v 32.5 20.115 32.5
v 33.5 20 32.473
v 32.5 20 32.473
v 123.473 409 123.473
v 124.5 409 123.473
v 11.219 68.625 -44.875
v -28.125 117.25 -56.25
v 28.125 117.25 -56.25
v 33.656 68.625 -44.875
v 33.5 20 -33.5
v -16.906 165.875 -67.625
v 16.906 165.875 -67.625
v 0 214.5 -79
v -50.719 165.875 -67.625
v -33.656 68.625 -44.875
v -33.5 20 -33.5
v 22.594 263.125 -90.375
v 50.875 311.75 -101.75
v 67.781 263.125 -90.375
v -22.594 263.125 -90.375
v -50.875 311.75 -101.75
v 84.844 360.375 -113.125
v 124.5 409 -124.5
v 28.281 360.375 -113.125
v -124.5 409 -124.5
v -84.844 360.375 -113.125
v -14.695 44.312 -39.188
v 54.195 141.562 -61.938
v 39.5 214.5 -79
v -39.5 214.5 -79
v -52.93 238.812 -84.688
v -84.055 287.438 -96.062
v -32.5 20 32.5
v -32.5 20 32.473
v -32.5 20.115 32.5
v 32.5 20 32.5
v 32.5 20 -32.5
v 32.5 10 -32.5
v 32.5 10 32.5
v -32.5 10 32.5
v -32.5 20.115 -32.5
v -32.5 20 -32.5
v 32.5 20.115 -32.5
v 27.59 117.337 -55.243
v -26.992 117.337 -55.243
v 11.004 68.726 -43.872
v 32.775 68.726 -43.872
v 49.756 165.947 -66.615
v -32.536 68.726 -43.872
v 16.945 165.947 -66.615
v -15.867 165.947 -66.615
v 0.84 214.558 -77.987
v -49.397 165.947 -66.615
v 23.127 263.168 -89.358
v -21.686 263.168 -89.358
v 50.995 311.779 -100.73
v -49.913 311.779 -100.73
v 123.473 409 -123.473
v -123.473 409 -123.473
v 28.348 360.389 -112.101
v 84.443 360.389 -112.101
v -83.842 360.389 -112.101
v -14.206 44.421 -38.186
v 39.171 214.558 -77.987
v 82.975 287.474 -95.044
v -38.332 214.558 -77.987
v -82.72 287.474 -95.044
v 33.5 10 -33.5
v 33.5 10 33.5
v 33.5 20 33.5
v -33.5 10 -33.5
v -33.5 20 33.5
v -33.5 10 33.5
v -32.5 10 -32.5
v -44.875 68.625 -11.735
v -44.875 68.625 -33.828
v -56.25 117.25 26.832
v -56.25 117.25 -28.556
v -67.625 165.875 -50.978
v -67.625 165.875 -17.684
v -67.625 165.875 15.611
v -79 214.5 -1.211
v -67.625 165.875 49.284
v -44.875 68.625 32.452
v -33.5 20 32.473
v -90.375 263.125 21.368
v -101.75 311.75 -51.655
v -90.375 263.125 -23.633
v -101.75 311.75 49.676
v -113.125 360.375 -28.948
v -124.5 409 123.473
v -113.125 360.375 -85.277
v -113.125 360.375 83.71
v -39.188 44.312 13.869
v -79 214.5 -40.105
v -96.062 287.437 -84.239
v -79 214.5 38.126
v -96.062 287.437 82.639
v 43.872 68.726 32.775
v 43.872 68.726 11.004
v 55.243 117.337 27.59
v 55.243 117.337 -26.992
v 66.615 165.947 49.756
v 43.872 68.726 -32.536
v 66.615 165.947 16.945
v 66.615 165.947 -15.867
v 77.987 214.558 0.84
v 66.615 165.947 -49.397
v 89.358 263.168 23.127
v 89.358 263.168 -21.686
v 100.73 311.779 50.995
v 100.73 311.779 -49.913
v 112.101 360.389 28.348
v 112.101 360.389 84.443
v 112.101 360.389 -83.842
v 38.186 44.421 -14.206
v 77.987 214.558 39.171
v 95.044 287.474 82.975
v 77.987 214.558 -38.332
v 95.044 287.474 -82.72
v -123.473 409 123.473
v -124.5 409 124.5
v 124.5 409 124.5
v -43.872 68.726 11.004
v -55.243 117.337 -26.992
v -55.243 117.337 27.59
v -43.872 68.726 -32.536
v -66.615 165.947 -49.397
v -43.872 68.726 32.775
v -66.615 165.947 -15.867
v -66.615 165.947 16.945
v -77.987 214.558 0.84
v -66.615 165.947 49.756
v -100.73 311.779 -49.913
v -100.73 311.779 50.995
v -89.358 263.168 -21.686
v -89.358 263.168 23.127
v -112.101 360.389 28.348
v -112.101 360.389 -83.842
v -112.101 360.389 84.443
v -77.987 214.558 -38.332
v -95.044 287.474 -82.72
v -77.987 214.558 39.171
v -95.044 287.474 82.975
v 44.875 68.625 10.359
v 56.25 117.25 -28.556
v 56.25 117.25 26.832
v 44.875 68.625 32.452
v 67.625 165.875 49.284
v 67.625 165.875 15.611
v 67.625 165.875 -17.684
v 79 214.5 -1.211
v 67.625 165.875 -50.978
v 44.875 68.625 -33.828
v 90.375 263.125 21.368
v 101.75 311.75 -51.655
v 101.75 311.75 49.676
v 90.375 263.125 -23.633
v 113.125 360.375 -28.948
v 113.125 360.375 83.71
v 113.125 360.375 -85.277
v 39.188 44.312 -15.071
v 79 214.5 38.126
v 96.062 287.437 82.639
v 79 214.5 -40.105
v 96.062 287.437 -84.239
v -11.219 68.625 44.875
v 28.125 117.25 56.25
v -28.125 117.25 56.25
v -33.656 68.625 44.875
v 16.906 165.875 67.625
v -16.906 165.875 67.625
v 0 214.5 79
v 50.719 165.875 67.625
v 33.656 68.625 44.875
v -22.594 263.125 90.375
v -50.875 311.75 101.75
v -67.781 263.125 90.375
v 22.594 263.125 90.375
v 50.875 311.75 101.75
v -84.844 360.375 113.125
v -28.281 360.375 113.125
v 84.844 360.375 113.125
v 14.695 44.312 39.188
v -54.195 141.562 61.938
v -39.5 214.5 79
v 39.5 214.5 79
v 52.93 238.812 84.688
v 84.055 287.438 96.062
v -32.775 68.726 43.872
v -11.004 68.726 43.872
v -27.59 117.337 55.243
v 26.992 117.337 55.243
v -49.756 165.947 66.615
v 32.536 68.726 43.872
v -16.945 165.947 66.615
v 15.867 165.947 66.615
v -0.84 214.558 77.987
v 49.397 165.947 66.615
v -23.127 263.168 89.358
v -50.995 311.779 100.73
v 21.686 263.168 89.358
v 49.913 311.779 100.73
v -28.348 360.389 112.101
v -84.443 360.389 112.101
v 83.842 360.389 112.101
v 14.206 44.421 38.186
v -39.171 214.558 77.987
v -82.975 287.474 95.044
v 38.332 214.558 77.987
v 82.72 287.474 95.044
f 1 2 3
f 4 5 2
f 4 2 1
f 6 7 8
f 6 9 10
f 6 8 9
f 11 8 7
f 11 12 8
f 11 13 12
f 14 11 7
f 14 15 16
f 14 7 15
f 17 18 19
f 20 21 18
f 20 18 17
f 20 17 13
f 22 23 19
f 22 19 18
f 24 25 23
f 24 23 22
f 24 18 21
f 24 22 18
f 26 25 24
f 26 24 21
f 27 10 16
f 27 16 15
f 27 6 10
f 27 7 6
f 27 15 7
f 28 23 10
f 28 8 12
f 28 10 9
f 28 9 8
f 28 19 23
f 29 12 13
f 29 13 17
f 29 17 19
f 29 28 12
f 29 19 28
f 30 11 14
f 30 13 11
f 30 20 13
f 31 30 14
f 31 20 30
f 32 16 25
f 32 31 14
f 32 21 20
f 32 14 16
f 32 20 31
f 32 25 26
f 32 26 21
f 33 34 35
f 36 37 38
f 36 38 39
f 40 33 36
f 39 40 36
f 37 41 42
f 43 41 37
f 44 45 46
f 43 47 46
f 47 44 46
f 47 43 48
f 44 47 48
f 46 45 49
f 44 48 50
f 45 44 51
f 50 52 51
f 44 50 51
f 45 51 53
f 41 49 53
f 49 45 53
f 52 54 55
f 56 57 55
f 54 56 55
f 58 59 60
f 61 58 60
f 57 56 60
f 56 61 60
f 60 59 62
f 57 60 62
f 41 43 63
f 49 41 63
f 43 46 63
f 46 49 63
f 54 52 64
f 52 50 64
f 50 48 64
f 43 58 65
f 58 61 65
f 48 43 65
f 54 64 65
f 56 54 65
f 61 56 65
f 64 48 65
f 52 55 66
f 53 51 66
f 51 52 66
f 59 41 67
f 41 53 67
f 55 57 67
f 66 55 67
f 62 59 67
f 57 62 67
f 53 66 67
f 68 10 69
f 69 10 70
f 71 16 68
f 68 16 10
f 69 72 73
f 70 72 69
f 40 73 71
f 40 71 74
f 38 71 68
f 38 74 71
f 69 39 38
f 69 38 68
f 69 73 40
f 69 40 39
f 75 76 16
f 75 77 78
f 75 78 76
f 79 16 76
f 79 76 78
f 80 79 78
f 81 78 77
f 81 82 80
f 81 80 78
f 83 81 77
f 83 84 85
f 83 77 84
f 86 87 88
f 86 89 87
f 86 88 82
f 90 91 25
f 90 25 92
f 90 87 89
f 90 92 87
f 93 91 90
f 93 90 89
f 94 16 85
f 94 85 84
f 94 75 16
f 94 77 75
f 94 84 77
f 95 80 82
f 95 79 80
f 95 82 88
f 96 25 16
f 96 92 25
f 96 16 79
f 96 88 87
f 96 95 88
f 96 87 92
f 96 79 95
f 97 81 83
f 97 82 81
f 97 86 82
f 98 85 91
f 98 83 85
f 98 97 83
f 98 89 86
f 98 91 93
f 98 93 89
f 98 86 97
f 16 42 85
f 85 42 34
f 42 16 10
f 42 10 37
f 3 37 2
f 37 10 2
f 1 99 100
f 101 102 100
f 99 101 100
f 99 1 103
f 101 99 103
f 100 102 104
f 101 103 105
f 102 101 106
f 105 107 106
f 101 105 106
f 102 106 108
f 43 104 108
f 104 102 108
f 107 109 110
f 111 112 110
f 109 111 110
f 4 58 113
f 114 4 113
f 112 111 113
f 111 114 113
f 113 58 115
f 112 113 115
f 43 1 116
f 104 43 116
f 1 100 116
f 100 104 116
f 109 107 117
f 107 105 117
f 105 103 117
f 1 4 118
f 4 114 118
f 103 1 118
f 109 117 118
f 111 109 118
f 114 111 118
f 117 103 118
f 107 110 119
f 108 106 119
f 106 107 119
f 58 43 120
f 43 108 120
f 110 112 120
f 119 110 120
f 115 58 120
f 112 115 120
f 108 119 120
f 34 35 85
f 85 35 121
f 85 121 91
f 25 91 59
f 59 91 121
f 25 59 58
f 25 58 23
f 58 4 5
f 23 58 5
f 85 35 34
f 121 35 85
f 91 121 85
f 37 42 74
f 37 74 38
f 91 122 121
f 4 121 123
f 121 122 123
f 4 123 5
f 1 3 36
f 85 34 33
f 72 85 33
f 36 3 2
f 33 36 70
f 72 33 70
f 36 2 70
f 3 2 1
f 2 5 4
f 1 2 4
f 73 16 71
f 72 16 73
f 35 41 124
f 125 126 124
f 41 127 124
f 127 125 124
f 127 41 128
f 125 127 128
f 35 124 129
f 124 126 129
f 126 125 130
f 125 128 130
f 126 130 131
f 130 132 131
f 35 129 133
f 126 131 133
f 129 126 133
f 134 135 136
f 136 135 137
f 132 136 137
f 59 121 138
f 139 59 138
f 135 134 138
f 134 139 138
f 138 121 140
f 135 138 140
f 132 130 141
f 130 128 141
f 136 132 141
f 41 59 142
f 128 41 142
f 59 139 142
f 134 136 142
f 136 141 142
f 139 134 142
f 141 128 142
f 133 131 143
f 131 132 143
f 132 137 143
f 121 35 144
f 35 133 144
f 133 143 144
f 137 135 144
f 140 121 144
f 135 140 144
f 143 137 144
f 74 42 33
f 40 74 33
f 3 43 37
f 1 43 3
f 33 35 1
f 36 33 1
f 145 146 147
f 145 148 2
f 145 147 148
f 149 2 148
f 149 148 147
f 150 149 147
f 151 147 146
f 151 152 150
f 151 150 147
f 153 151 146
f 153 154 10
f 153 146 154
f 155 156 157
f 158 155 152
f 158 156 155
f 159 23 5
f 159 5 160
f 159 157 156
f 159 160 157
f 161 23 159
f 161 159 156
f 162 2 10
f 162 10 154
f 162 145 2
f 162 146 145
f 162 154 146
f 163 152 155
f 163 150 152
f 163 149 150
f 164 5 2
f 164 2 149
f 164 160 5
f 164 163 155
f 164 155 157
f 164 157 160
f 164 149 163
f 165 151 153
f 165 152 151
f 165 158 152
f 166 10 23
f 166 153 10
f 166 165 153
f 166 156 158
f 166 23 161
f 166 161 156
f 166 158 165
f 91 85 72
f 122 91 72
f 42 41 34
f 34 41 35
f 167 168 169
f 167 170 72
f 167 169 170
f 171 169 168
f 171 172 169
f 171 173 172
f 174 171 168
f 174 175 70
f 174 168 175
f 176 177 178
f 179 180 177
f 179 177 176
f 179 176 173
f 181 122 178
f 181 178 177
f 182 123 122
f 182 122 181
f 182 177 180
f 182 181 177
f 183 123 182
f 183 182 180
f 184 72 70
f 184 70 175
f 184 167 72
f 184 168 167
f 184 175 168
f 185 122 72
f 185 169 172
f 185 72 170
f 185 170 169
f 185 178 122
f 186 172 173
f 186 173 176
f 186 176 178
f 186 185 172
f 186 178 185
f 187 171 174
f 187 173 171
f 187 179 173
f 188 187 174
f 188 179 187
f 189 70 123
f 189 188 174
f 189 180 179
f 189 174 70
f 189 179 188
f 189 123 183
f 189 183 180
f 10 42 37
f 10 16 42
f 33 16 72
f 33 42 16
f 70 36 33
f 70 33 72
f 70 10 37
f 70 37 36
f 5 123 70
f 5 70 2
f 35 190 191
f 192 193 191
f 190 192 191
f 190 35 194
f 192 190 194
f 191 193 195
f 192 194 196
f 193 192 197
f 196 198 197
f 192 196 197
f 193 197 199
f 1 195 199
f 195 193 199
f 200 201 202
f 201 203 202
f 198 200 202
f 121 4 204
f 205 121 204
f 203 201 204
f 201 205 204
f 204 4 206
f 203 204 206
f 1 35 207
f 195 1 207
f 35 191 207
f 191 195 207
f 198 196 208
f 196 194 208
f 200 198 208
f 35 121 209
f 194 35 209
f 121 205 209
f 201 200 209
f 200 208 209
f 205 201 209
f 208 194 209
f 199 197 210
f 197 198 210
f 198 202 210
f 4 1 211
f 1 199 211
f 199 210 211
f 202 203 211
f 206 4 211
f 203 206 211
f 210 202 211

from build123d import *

# Parameters (mm, degrees)
SKETCH4_W           = 67
SKETCH4_H           = 67
BOSS_EXTRUDE1_DEPTH = 10
SHELL1_T            = -1
SKETCH5_W           = 633.424924629
SKETCH5_H           = 1048.938211475


with BuildPart() as part:
    # Sketch1 → Loft1 section 0
    with BuildSketch(Plane(origin=(0, 20, 0), x_dir=(1, 0, 0), z_dir=(0, 1, 0))):
        with BuildLine():
            Line((-33.5, -33.5), (33.5, -33.5))
            Line((33.5, -33.5), (33.5, 33.5))
            Line((33.5, 33.5), (-33.5, 33.5))
            Line((-33.5, 33.5), (-33.5, -33.5))
        make_face()
    # Sketch3 → Loft1 section 1
    with BuildSketch(Plane(origin=(0, 409, 0), x_dir=(1, 0, 0), z_dir=(0, 1, 0))):
        with BuildLine():
            Line((-124.5, 124.5), (-124.5, -124.5))
            Line((-124.5, -124.5), (124.5, -124.5))
            Line((124.5, -124.5), (124.5, 124.5))
            Line((124.5, 124.5), (-124.5, 124.5))
        make_face()
    loft()

    # Sketch4 → Boss-Extrude1 (add)
    with BuildSketch(Plane.XZ.offset(-20)):
        Rectangle(SKETCH4_W, SKETCH4_H)
    extrude(amount=BOSS_EXTRUDE1_DEPTH)

    # Shell1
    shell1_openings = [part.faces().sort_by_distance(p)[0] for p in [
        (0, 409, 0),
        (0, 10, 0),
    ]]
    offset(amount=SHELL1_T, openings=shell1_openings, kind=Kind.INTERSECTION)


with BuildPart() as body_2:
    # Split2: the piece on the far side of the plane
    add(part.part)
    split(bisect_by=Plane.ZX.offset(20), keep=Keep.BOTTOM)


with BuildPart() as part_1:
    add(part.part)

    # Split2
    split(bisect_by=Plane.ZX.offset(20), keep=Keep.TOP)


with BuildPart() as body_3:
    # Split1: the piece behind the surface
    add(part_1.part)
    # Sketch5 → Surface-Plane1: a flat surface bounded by the sketch
    with BuildSketch(Plane(origin=(0, -6.164658342, 26.352220824), x_dir=(-1, 0, 0), z_dir=(0, 0.2277834821060713, -0.9737118081237555)), mode=Mode.PRIVATE) as surface_plane1_1_region:
        with Locations((37.459244568, 105.176722524)):
            Rectangle(SKETCH5_W, SKETCH5_H)
    surface_plane1_1 = surface_plane1_1_region.sketch.faces()[0]
    split(bisect_by=surface_plane1_1, keep=Keep.BOTTOM)


with BuildPart() as part_2:
    add(part_1.part)

    # Split1: split by a surface, the side it looks to stays
    # Sketch5 → Surface-Plane1: a flat surface bounded by the sketch
    with BuildSketch(Plane(origin=(0, -6.164658342, 26.352220824), x_dir=(-1, 0, 0), z_dir=(0, 0.2277834821060713, -0.9737118081237555)), mode=Mode.PRIVATE) as surface_plane1_2_region:
        with Locations((37.459244568, 105.176722524)):
            Rectangle(SKETCH5_W, SKETCH5_H)
    surface_plane1_2 = surface_plane1_2_region.sketch.faces()[0]
    split(bisect_by=surface_plane1_2, keep=Keep.TOP)


solid = Compound([body_2.part, body_3.part, part_2.part])
